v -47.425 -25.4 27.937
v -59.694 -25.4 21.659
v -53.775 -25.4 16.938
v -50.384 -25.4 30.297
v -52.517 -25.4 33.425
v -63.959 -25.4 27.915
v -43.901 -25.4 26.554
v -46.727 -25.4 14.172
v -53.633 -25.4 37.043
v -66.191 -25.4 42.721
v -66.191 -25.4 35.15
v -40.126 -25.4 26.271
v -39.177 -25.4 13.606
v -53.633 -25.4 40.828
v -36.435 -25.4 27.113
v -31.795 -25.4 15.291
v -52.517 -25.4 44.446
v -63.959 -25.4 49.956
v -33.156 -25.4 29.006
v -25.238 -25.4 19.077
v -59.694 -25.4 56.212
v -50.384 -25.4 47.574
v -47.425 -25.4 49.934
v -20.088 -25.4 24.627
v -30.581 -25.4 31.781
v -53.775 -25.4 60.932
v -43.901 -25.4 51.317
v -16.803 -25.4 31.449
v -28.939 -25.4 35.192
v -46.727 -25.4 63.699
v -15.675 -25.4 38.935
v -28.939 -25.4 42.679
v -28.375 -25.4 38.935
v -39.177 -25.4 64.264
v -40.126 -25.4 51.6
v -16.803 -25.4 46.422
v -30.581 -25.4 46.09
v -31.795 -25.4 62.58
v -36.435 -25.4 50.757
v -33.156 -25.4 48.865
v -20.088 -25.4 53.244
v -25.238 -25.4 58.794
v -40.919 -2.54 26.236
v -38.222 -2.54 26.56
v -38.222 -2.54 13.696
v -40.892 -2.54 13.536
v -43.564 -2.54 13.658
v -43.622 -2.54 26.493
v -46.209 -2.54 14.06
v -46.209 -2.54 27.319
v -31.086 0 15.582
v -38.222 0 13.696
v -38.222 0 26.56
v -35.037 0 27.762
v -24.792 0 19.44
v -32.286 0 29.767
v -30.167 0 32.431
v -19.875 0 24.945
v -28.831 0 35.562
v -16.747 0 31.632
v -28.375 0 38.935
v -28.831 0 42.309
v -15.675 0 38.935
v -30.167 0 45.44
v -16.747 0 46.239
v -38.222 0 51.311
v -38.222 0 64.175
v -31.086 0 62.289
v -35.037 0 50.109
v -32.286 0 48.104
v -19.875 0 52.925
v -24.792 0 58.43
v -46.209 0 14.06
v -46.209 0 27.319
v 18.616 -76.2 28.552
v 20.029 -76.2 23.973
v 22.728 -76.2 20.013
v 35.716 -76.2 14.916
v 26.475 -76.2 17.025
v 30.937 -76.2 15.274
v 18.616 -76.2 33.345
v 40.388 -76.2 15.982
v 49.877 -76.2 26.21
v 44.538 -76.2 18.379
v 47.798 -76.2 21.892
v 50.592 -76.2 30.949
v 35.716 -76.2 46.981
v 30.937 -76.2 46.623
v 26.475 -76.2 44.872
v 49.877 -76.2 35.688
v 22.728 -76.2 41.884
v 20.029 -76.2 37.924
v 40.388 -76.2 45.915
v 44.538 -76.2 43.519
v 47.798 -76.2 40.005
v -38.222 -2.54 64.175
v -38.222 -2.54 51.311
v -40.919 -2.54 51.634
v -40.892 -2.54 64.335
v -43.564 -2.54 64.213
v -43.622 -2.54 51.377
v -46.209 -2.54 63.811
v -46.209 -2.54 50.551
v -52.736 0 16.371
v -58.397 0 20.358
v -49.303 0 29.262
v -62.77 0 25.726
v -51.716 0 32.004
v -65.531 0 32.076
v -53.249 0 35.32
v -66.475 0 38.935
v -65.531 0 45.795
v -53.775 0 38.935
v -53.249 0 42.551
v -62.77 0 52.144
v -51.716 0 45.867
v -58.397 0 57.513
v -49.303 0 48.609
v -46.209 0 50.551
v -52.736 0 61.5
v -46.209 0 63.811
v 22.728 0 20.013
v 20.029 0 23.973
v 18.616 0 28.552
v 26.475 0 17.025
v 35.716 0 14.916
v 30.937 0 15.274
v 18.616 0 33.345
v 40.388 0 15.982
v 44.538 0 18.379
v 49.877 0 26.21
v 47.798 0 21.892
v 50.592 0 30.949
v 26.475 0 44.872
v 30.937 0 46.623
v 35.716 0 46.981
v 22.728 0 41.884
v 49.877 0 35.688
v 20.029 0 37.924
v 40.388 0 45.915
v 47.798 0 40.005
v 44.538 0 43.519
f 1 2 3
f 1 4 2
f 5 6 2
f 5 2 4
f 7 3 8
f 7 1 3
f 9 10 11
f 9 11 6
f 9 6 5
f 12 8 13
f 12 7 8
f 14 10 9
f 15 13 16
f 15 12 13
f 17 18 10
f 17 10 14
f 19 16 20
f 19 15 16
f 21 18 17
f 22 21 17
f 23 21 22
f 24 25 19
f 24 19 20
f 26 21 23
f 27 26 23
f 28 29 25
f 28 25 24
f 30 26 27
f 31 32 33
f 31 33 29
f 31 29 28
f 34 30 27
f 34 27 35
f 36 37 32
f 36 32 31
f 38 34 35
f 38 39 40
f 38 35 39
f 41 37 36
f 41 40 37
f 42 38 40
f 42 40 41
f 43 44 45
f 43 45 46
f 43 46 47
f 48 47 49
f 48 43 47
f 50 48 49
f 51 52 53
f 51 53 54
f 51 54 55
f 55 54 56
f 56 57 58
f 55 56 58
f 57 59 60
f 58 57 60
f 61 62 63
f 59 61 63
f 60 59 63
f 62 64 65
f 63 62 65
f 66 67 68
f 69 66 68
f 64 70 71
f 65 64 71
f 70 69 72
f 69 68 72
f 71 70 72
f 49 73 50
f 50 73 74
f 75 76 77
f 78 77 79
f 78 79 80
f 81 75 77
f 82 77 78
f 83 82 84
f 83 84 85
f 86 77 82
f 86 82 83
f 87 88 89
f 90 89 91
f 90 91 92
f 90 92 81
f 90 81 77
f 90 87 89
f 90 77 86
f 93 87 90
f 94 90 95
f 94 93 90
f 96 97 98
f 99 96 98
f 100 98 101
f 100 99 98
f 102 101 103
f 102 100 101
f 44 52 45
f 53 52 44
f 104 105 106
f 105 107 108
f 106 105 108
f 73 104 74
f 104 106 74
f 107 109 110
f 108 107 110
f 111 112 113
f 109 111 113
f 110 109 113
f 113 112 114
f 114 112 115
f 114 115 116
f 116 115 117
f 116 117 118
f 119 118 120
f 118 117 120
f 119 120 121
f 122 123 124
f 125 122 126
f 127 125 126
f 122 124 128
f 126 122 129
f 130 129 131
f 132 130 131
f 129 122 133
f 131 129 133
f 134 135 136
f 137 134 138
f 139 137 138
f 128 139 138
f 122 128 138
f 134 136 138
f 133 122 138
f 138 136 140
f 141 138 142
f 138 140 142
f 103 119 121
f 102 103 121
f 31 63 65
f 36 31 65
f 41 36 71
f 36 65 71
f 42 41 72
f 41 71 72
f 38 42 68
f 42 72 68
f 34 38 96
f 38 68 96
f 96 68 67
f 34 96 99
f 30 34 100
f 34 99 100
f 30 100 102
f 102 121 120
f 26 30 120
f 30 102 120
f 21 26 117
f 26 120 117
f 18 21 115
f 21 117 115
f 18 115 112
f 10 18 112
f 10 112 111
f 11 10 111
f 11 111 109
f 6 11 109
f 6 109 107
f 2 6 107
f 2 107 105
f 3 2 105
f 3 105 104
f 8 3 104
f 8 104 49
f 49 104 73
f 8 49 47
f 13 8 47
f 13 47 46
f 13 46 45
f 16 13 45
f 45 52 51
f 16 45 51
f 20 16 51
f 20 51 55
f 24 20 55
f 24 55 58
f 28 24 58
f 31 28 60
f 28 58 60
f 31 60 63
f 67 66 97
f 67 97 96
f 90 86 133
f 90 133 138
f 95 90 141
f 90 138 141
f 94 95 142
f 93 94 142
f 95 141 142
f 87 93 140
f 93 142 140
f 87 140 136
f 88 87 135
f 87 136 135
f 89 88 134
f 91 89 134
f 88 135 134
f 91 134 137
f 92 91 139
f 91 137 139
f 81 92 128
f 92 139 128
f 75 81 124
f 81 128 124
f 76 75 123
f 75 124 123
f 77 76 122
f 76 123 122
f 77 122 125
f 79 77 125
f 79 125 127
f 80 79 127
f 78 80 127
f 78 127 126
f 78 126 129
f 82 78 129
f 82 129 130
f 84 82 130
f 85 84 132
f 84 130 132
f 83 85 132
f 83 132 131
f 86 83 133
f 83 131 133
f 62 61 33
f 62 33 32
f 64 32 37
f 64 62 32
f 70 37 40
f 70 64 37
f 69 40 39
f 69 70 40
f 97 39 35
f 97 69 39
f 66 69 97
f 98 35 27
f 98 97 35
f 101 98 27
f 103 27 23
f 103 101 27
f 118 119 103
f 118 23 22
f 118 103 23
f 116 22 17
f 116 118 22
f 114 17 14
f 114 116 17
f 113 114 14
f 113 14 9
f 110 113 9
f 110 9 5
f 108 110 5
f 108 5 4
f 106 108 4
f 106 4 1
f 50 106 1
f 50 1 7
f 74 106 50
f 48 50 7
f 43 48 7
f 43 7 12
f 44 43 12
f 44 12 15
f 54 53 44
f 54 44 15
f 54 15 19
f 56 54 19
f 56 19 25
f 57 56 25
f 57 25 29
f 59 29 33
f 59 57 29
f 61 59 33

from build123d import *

# Parameters (mm, degrees)
F0_R     = 25.4
F0_R_2   = 12.7
F2_DEPTH = 25.4
F1_R     = 16.0775521087
F3_DEPTH = 76.2
F4_W     = 7.9867392778
F4_H     = 68.60037148
F5_DEPTH = 2.54
F6_DEPTH = 2.54


with BuildPart() as f2:
    # F0 (on Front) → F2 (new body)
    with BuildSketch(Plane.XZ):
        with Locations((-41.0746522248, 38.9353483915)):
            Circle(F0_R)
        with Locations((-41.0746522248, 38.9353483915)):
            Circle(F0_R_2, mode=Mode.SUBTRACT)
    extrude(amount=F2_DEPTH)

    # F4 (on face) → F5 (cut)
    with BuildSketch(Plane(origin=(0, 0, 0), x_dir=(-1, 0, 0), z_dir=(0, 1, 0))):
        with Locations((42.2156155109, 34.30018574)):
            Rectangle(F4_W, F4_H)
    extrude(amount=F5_DEPTH, mode=Mode.SUBTRACT)

    # F4 (on face) → F6 (cut)
    with BuildSketch(Plane(origin=(0, 0, 0), x_dir=(-1, 0, 0), z_dir=(0, 1, 0))):
        with Locations((42.2156155109, 34.30018574)):
            Rectangle(F4_W, F4_H)
    extrude(amount=-F6_DEPTH, mode=Mode.SUBTRACT)


with BuildPart() as f3:
    # F1 (on Front) → F3 (new body)
    with BuildSketch(Plane.XZ):
        with Locations((34.5141217113, 30.9486091137)):
            Circle(F1_R)
    extrude(amount=F3_DEPTH)


solid = Compound([f2.part, f3.part])
